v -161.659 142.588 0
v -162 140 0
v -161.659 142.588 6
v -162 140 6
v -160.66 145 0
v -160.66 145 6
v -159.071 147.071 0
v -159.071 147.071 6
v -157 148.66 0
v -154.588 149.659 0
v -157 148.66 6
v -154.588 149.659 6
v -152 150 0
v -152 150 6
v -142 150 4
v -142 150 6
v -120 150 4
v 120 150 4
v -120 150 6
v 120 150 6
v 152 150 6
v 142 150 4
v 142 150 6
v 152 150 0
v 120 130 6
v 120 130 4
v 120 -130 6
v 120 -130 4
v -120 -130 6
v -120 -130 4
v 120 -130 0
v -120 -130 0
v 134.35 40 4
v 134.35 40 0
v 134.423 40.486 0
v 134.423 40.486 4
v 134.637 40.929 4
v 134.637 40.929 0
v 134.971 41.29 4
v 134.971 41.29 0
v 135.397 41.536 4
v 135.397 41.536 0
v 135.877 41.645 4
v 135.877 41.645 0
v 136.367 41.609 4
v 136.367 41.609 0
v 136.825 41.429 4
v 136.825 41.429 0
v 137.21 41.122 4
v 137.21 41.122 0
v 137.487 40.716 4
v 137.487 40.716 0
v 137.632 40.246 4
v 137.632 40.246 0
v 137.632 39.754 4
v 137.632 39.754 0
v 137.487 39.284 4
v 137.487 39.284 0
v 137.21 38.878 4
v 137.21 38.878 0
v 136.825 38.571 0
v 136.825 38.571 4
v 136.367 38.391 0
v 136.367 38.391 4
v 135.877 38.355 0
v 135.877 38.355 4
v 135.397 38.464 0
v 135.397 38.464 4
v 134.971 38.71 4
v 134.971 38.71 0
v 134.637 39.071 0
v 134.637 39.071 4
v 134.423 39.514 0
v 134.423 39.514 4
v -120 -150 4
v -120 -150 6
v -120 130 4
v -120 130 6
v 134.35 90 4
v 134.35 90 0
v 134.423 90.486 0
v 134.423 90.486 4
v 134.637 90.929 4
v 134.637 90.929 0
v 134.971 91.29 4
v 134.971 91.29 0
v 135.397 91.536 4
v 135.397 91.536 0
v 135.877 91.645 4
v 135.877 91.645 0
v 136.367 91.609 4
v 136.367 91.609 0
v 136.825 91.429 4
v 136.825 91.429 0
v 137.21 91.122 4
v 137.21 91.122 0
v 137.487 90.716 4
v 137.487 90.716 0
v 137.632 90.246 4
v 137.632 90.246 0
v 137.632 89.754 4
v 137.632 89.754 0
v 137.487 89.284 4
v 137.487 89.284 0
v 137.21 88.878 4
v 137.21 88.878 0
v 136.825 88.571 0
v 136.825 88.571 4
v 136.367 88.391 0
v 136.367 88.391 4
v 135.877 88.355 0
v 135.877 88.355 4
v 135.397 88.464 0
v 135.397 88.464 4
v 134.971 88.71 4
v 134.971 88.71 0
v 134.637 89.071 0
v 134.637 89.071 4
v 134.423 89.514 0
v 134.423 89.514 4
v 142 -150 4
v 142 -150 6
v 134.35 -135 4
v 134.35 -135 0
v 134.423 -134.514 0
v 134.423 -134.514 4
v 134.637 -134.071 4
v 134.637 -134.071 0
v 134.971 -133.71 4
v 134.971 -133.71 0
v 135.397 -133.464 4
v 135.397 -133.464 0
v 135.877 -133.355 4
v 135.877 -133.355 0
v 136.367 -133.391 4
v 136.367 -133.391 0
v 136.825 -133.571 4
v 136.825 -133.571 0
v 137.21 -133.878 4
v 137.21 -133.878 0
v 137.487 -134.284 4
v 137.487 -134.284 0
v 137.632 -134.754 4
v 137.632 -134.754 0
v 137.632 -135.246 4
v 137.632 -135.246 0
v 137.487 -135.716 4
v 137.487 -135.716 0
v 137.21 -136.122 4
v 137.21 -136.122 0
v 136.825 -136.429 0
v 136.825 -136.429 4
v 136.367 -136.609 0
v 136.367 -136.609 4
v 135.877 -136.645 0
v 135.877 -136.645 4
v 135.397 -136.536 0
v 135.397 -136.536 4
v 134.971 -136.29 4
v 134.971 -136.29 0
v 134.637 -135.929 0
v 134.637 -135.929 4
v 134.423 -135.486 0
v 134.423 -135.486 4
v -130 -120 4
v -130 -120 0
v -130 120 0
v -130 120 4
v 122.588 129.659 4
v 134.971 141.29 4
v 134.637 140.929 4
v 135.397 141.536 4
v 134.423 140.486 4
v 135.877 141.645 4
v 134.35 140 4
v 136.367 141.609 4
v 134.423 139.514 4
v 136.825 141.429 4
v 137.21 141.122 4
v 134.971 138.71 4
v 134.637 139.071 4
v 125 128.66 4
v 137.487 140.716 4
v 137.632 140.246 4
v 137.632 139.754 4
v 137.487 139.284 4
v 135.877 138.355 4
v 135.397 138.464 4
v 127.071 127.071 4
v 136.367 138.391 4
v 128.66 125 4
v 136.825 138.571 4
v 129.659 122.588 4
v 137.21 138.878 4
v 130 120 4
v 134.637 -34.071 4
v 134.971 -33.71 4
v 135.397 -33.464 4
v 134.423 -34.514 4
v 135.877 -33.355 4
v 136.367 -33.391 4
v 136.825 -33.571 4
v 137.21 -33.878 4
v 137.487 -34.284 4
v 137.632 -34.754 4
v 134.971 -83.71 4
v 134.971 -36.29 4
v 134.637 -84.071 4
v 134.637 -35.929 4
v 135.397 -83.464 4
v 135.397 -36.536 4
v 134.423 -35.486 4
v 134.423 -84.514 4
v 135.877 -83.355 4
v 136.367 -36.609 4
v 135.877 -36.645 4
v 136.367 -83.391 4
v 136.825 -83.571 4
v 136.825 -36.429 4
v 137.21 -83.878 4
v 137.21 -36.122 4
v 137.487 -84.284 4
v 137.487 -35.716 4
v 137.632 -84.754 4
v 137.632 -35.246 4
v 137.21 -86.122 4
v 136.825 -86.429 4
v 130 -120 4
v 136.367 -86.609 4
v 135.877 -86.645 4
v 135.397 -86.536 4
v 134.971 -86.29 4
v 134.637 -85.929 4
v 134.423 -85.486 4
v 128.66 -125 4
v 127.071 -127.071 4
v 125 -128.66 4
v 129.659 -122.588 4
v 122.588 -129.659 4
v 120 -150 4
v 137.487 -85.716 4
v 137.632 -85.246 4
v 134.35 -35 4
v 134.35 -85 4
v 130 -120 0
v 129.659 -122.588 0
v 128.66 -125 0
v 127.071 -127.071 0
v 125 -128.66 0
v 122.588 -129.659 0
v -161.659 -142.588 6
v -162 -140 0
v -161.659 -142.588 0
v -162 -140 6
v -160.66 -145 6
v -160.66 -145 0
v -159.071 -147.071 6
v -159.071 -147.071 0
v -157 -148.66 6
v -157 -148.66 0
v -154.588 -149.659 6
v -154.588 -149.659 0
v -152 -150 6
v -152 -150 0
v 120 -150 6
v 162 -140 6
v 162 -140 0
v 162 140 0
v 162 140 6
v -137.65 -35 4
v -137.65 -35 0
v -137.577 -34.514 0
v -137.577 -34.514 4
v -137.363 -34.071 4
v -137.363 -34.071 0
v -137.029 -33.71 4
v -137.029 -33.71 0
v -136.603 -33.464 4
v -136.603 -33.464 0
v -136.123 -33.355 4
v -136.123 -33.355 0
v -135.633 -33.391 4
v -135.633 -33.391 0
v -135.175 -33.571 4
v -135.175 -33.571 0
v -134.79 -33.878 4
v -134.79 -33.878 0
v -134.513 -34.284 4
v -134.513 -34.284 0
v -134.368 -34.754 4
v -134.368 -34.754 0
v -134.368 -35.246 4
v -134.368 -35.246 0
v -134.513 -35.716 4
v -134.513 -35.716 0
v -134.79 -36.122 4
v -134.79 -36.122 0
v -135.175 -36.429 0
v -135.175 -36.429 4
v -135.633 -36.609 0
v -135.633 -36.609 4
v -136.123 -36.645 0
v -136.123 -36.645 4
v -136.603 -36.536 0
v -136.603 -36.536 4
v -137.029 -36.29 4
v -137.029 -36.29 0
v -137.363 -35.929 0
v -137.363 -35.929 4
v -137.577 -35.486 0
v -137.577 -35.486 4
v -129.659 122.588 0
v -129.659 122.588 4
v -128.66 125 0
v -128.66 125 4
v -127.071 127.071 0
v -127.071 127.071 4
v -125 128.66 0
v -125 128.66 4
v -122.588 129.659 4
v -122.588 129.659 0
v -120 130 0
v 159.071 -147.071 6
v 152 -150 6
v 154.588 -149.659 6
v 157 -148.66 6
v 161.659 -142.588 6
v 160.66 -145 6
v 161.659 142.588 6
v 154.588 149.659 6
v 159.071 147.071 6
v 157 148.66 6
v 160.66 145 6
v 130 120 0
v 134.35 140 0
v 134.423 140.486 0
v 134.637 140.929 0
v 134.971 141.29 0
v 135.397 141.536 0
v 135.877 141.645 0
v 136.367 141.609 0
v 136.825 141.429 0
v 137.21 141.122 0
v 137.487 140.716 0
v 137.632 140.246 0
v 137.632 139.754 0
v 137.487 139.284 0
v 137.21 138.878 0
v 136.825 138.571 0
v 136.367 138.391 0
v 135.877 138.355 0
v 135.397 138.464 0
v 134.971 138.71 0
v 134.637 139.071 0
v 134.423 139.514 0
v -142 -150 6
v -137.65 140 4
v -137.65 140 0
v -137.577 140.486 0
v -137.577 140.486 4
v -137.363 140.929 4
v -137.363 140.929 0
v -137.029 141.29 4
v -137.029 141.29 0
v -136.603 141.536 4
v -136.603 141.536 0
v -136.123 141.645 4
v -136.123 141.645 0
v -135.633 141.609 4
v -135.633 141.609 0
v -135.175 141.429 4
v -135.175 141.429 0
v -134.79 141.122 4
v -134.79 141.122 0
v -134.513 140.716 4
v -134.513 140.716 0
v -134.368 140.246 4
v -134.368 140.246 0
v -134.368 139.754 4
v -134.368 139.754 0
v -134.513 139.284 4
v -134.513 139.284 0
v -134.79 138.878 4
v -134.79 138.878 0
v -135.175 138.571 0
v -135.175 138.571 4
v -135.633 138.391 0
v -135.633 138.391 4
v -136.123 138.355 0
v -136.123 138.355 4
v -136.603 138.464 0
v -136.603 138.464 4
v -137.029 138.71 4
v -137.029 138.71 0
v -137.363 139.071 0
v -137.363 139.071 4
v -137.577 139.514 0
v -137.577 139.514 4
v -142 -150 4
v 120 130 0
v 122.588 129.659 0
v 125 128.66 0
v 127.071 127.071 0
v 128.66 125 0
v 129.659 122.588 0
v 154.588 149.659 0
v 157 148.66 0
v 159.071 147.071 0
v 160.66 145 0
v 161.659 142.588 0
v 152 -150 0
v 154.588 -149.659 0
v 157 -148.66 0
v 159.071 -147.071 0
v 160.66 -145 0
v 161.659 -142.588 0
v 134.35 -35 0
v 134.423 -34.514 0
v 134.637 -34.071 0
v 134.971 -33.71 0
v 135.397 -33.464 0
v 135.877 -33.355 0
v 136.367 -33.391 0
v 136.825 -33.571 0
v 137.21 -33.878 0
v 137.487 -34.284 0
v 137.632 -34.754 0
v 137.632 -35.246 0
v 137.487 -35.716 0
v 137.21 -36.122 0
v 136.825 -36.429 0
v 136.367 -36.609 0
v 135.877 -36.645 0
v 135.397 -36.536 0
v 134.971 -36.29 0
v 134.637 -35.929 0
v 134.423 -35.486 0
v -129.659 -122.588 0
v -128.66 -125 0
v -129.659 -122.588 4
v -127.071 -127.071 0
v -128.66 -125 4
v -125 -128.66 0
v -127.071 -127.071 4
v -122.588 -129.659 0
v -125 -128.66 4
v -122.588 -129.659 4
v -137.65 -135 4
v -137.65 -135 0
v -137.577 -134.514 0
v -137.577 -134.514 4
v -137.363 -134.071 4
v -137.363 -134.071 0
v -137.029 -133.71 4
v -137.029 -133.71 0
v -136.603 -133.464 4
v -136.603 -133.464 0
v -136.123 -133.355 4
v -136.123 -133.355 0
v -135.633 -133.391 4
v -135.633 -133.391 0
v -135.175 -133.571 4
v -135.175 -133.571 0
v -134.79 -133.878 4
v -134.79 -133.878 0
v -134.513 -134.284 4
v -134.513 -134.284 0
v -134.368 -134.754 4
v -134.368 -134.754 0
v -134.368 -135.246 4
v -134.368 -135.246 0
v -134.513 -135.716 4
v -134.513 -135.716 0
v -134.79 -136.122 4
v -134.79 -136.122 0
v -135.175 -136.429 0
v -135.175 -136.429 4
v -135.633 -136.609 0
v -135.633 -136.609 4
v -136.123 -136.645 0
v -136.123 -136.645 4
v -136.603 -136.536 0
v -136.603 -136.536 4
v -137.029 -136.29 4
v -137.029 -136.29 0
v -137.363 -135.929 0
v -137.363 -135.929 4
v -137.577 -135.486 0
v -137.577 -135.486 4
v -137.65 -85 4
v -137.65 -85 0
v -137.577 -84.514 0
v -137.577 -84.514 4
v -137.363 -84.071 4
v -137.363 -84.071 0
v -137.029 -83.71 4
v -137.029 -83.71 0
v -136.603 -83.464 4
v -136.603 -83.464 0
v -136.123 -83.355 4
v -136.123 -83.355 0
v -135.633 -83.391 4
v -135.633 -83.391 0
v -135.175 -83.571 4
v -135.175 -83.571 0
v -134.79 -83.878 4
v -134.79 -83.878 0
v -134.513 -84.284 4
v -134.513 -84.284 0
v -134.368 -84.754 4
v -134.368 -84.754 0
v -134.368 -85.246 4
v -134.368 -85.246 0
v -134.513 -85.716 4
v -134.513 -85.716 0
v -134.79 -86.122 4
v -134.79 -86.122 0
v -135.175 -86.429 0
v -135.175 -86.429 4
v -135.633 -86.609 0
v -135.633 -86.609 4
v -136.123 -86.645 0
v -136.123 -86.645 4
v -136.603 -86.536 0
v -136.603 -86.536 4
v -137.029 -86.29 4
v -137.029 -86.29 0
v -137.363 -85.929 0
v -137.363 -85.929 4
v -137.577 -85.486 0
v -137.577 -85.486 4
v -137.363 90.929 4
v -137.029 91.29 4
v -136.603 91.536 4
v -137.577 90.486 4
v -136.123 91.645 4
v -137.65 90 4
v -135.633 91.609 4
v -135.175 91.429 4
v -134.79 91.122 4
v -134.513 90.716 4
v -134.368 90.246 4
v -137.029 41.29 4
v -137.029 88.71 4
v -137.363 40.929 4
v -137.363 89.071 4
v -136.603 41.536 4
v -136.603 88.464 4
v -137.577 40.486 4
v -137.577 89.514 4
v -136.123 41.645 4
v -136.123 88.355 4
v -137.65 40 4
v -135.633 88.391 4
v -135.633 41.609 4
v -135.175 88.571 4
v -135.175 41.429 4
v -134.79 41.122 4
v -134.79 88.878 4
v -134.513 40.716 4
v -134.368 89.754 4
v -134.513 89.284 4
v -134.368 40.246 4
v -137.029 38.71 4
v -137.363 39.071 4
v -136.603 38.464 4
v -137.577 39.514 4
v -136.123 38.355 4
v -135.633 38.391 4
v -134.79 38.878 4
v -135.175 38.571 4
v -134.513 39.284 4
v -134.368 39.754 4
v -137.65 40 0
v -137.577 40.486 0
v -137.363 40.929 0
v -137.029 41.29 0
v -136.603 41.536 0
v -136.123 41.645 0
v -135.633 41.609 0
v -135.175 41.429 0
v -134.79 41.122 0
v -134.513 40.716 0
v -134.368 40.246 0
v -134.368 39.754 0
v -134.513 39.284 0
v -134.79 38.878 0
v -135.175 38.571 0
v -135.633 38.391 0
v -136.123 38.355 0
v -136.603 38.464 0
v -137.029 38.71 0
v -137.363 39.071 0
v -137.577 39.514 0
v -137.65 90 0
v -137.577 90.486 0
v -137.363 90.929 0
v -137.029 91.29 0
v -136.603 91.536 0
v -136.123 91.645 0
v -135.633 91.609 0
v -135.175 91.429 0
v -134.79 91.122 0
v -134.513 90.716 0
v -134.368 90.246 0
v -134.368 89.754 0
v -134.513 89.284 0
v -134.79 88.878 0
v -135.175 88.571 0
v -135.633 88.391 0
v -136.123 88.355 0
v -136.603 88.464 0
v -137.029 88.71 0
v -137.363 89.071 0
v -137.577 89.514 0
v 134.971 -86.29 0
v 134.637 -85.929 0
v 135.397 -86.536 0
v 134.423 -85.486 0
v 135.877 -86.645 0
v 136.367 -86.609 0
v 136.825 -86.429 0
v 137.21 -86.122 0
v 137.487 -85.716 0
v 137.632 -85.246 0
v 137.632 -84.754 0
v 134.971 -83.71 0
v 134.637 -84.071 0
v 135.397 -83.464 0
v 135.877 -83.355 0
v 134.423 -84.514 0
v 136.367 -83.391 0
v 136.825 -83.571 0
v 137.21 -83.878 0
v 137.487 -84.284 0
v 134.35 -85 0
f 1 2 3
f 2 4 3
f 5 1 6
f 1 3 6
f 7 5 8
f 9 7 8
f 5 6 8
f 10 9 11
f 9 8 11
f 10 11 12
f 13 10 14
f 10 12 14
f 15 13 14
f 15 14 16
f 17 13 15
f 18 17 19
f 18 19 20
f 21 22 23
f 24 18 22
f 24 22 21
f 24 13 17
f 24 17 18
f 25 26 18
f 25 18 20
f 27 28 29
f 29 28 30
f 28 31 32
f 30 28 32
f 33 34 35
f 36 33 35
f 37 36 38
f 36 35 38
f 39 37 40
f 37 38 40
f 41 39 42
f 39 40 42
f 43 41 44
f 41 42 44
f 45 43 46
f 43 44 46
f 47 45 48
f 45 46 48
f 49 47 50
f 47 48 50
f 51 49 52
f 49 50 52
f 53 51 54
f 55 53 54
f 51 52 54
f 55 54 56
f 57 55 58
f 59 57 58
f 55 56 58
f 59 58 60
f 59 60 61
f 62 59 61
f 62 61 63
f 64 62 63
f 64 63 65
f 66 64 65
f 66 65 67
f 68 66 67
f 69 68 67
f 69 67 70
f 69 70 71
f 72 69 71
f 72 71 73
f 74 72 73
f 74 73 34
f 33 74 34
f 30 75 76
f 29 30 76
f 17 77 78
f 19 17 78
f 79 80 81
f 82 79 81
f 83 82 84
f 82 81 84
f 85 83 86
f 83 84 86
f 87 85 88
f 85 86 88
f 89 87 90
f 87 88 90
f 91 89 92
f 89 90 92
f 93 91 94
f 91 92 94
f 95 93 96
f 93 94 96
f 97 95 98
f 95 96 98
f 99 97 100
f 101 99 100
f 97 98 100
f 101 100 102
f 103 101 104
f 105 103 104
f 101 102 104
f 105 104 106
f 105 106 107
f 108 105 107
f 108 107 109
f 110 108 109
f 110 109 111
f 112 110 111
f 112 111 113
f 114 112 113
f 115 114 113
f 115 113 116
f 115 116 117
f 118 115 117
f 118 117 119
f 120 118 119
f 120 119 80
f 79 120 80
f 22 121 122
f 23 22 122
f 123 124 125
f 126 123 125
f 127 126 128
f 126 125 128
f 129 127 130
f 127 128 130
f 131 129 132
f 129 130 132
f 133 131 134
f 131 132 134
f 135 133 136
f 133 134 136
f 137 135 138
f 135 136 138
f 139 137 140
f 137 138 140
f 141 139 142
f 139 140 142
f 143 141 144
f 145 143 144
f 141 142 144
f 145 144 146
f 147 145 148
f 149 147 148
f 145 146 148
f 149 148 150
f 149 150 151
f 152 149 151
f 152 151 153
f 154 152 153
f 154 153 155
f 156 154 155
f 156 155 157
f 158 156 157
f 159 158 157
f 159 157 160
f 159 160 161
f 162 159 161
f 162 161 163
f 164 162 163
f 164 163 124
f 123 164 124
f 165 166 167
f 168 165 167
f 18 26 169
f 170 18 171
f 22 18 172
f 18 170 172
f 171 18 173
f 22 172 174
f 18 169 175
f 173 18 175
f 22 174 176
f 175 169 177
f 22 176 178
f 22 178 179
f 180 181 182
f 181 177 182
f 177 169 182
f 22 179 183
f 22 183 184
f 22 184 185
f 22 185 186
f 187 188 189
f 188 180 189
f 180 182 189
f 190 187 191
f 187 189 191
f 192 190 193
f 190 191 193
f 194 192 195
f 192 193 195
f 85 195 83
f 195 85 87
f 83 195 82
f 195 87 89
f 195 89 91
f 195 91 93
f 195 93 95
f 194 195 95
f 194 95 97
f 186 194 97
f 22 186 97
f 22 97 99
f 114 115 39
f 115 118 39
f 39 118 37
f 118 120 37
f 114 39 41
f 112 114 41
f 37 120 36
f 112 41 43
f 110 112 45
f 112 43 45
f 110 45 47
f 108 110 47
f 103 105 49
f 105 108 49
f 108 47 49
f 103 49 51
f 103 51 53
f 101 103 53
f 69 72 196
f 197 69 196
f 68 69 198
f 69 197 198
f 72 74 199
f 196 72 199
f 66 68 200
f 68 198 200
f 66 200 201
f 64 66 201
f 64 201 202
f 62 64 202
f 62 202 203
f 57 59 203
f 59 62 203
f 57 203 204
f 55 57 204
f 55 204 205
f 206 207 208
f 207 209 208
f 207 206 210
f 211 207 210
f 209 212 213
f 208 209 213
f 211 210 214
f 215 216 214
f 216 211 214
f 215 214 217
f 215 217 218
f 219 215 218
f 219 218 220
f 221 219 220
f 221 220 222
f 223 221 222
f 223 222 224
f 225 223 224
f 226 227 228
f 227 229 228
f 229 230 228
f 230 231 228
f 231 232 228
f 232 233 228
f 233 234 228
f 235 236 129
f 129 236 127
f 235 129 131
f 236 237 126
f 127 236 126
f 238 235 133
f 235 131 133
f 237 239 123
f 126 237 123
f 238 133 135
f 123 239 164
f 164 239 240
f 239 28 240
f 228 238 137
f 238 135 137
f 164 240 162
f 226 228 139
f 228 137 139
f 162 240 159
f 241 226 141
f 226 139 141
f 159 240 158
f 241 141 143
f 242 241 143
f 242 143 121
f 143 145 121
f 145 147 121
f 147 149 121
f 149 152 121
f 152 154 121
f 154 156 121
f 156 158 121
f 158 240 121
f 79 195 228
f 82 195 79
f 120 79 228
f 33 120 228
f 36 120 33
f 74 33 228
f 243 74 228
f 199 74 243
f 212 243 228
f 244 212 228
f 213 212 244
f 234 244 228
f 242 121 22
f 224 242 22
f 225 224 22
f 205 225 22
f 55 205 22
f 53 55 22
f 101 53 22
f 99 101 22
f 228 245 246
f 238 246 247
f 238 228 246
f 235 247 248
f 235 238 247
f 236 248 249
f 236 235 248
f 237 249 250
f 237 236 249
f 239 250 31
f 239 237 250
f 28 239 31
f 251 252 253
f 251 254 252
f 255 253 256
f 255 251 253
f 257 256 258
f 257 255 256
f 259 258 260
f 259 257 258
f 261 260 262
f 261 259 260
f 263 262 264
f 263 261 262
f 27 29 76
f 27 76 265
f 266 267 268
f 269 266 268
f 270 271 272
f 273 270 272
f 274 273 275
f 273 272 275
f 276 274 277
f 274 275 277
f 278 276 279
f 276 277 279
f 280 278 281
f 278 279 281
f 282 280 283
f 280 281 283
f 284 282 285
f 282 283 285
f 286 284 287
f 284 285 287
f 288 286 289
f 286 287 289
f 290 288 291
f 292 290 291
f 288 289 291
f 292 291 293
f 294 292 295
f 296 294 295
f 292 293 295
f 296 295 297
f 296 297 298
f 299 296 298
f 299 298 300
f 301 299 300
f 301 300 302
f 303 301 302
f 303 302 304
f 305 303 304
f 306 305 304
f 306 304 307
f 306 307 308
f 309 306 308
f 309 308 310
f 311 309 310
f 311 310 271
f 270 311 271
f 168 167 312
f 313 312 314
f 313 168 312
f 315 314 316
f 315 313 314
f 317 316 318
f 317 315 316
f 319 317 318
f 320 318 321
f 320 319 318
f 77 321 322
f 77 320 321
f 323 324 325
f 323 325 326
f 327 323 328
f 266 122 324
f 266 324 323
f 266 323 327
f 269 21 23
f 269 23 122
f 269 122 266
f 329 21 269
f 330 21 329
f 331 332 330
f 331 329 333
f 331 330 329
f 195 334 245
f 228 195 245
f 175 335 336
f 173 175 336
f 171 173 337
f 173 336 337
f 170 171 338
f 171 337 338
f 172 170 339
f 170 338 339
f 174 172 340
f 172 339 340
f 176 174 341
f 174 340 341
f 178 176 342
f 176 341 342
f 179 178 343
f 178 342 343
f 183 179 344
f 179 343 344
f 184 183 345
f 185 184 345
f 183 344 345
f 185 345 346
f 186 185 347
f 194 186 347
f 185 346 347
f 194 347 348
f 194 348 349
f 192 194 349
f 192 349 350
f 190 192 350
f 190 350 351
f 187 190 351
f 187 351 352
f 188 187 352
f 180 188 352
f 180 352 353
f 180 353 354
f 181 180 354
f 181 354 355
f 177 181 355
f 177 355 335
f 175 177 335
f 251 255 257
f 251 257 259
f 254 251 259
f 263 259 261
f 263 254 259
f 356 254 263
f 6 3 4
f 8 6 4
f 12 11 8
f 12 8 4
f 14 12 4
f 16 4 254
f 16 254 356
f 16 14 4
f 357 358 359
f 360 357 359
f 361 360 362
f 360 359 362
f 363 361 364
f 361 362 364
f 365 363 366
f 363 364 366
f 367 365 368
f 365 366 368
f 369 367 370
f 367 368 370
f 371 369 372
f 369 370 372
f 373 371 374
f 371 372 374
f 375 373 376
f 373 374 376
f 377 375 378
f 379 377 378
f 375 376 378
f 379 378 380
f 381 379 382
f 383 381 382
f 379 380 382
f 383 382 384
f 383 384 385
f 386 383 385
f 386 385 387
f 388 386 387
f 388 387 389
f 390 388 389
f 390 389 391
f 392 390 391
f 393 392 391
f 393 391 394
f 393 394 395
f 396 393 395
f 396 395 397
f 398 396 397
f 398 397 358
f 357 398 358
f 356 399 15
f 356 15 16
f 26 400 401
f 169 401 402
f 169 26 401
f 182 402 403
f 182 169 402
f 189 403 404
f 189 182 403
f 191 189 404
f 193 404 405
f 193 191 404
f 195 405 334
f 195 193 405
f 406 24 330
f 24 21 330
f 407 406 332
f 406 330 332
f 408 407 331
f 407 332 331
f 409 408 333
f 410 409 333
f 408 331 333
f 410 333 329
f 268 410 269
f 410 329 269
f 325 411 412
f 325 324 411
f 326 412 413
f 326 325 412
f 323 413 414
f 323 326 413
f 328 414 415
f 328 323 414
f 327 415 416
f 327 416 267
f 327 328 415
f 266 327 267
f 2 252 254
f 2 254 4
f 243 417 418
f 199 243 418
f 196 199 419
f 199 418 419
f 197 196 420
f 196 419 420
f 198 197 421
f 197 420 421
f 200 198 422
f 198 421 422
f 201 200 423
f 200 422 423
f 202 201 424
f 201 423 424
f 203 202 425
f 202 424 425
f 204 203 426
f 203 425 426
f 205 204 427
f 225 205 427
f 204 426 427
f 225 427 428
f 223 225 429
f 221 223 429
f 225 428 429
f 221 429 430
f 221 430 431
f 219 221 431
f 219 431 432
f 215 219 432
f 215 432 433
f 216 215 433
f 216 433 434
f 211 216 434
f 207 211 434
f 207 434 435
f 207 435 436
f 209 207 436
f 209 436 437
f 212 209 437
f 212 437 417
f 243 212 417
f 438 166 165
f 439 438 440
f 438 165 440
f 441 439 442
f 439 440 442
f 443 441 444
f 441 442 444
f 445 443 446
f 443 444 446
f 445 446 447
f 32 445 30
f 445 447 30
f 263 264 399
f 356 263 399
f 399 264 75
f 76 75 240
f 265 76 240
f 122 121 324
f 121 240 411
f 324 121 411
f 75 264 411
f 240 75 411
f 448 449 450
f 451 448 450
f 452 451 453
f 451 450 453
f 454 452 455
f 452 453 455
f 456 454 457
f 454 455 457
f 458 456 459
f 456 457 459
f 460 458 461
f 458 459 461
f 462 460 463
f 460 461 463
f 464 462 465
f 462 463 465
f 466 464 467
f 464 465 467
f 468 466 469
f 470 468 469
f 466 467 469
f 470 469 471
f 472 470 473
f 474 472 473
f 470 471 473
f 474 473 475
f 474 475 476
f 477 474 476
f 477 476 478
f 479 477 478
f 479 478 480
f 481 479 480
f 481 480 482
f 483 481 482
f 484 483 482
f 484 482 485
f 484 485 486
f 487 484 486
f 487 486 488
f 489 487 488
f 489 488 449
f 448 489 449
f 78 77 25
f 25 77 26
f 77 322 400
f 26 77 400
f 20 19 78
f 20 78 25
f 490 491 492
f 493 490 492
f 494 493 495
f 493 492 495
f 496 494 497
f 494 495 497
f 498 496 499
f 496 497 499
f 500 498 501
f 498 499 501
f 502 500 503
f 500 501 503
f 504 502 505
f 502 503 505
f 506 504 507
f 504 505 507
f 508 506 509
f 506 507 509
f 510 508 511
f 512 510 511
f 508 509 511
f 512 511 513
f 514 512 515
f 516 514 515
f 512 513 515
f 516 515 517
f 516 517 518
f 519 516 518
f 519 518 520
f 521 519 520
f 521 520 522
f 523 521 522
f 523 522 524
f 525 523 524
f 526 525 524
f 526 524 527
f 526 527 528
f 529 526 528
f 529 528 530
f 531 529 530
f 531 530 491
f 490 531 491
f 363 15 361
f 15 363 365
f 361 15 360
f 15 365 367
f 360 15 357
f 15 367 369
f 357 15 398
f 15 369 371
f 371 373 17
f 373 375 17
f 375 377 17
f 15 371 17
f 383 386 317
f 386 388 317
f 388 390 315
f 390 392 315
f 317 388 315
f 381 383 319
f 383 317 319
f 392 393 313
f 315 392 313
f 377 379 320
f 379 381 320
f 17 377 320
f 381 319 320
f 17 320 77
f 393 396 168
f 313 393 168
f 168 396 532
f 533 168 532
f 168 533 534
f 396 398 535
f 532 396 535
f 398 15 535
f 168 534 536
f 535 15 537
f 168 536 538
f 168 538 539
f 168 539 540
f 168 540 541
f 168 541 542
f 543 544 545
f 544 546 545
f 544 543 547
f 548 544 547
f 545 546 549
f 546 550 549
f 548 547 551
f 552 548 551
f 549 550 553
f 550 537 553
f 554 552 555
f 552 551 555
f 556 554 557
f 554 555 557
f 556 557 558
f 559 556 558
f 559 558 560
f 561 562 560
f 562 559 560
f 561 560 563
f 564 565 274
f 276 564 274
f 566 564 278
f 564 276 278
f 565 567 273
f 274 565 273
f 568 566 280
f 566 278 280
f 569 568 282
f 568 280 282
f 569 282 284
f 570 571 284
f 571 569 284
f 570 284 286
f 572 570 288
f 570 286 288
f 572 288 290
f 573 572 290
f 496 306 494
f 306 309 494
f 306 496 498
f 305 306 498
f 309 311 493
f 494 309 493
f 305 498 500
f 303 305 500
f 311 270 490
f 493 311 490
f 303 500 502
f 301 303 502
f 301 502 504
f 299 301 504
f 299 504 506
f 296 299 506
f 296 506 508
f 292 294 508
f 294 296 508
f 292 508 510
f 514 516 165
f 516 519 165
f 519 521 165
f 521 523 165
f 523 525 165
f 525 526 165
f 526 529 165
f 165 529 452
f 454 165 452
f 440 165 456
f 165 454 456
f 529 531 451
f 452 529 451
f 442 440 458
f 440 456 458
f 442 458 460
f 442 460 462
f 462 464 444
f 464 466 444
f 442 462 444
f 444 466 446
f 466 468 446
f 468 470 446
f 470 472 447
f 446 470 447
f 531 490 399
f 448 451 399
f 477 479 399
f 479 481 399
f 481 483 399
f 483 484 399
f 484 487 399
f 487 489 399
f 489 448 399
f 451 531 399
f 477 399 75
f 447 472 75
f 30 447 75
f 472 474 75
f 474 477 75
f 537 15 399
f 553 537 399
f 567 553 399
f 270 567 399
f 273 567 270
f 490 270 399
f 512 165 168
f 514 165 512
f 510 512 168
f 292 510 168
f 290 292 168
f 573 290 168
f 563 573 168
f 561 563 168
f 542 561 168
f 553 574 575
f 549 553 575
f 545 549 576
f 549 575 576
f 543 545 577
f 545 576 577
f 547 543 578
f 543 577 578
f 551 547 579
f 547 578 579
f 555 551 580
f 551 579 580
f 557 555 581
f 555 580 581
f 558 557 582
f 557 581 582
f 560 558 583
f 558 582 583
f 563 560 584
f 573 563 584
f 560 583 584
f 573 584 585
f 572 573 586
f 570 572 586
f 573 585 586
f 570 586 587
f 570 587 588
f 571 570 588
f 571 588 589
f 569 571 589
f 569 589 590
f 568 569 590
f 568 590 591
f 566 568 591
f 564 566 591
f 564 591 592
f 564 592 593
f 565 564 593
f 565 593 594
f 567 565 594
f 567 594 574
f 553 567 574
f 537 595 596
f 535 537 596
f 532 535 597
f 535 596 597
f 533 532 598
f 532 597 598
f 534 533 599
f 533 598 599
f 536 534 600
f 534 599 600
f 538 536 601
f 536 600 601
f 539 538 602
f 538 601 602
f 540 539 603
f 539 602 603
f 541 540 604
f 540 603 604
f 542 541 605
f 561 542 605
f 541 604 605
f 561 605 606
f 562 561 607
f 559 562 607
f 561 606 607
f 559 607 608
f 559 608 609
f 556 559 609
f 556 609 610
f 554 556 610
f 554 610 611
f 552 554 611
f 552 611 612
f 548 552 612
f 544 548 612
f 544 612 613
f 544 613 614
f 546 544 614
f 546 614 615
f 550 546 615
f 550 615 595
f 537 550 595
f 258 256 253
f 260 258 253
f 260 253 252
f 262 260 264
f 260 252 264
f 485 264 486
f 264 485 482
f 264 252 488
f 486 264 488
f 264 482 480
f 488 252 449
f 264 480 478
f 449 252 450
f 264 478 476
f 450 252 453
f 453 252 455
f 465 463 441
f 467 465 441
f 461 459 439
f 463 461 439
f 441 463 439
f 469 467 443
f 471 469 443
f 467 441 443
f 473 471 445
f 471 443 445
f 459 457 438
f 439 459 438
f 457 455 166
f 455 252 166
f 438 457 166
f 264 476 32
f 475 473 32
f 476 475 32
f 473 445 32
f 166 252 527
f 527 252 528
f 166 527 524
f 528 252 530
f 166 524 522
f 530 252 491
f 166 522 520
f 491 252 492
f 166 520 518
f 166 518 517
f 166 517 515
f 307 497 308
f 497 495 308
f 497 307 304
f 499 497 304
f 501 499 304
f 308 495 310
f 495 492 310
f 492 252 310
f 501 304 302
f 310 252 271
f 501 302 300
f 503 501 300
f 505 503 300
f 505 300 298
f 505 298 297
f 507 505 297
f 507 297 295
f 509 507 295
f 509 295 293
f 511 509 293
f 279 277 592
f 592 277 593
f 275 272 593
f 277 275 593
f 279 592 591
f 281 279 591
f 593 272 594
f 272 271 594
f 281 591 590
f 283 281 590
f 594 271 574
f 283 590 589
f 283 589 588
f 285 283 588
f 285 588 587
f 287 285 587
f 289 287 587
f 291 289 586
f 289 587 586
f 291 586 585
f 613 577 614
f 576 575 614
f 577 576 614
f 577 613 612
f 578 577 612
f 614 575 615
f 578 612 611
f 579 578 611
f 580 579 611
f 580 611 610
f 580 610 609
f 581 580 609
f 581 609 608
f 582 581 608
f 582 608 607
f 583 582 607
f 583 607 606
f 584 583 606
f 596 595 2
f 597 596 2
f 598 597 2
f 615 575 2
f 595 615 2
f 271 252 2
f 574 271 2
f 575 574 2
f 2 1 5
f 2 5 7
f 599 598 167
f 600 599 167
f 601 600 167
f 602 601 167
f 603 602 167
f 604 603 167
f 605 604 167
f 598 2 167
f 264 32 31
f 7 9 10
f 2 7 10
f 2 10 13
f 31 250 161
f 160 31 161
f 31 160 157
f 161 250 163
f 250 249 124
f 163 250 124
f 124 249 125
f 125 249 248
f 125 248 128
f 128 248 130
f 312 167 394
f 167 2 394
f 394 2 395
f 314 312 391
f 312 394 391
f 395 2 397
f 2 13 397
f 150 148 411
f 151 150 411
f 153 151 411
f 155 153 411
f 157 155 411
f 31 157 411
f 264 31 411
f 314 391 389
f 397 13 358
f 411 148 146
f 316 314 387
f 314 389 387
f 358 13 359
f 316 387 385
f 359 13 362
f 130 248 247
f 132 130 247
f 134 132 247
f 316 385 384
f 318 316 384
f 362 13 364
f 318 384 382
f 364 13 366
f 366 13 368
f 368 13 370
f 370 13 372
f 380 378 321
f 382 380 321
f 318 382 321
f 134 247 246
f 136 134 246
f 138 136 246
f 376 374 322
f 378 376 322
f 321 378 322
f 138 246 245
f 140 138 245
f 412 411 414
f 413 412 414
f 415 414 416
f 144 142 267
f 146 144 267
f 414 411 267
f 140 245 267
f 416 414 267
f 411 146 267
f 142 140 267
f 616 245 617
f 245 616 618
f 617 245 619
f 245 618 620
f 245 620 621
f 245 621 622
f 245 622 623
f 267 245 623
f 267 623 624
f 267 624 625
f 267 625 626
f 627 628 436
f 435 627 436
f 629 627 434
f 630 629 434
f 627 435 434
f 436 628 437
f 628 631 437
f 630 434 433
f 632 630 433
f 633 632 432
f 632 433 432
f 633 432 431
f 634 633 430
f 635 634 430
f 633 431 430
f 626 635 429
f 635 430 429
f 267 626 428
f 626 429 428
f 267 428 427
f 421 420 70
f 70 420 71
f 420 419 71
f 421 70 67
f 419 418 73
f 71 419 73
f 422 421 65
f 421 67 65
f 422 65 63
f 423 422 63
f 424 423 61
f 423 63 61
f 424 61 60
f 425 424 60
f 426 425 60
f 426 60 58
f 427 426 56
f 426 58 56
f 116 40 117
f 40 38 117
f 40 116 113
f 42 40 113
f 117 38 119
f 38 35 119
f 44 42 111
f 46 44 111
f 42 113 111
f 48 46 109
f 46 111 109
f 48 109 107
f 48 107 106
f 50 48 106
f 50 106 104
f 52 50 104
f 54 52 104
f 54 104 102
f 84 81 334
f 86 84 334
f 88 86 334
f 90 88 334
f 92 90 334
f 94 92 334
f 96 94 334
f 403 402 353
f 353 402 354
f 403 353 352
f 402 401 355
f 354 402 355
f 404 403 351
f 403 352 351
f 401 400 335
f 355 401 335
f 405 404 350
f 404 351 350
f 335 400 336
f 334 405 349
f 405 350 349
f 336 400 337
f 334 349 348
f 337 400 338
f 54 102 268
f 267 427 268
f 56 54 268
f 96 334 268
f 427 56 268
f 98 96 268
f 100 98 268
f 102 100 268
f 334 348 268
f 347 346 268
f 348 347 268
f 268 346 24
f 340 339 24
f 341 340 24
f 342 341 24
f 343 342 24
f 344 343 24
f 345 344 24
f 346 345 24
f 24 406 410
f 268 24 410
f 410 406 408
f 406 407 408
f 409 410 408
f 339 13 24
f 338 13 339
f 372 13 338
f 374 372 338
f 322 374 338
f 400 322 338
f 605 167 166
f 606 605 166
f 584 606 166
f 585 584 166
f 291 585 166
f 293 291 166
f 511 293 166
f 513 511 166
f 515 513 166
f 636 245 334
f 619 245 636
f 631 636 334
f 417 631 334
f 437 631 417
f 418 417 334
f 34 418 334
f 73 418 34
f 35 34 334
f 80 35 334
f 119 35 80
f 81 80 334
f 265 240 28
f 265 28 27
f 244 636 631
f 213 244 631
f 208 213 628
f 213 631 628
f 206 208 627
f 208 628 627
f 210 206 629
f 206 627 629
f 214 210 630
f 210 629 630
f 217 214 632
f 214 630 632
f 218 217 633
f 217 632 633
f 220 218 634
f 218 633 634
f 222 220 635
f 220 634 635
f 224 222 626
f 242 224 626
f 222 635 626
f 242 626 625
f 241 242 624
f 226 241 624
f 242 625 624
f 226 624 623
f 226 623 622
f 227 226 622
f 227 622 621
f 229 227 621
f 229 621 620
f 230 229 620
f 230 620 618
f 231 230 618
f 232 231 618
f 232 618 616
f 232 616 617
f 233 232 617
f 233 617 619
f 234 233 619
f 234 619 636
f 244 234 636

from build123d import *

# Parameters (mm, degrees)
F0_W     = 324
F0_H     = 300
F1_DEPTH = 6
F2_R     = 10
F3_W     = 22
F3_H     = 2
F4_DEPTH = 300
F6_D     = 3.3
F6_DEPTH = 14.1
F6_TIP   = 0.9914200214
F7_R     = 10


with BuildPart() as f1:
    # F0 (on Top) → F1 (new body)
    with BuildSketch(Plane.XY):
        Rectangle(F0_W, F0_H)
        Polygon((-130, 0), (-130, 130), (130, 130), (130, 0), (130, -130), (-130, -130), align=None, mode=Mode.SUBTRACT)
    extrude(amount=F1_DEPTH)

    # F2
    f2_edges = [f1.edges().sort_by_distance(p)[0] for p in [
        (130, 130, 3),
        (-130, 130, 3),
        (-130, -130, 3),
        (130, -130, 3),
    ]]
    fillet(f2_edges, radius=F2_R)

    # F3 (on face) → F4 (cut)
    with BuildSketch(Plane.XZ.offset(150)):
        with Locations((-131, 5)):
            Rectangle(F3_W, F3_H)
        with Locations((131, 5)):
            Rectangle(F3_W, F3_H)
    extrude(amount=-F4_DEPTH, mode=Mode.SUBTRACT)

    # F6
    with Locations(Plane.XY.offset(4)):
        with Locations((-136, 140), (-136, 90), (-136, -135), (136, -135), (136, 90), (136, 140), (136, -85), (-136, -85), (-136, 40), (-136, -35), (136, -35), (136, 40)):
            Hole(F6_D / 2, depth=F6_DEPTH)
            with Locations((0, 0, -(F6_DEPTH + F6_TIP / 2))):  # 118° drill point
                Cone(0, F6_D / 2, F6_TIP, mode=Mode.SUBTRACT)

    # F7
    f7_edges = [f1.edges().sort_by_distance(p)[0] for p in [
        (162, -150, 3),
        (162, 150, 3),
        (-162, -150, 3),
        (-162, 150, 3),
    ]]
    fillet(f7_edges, radius=F7_R)


solid = f1.part
